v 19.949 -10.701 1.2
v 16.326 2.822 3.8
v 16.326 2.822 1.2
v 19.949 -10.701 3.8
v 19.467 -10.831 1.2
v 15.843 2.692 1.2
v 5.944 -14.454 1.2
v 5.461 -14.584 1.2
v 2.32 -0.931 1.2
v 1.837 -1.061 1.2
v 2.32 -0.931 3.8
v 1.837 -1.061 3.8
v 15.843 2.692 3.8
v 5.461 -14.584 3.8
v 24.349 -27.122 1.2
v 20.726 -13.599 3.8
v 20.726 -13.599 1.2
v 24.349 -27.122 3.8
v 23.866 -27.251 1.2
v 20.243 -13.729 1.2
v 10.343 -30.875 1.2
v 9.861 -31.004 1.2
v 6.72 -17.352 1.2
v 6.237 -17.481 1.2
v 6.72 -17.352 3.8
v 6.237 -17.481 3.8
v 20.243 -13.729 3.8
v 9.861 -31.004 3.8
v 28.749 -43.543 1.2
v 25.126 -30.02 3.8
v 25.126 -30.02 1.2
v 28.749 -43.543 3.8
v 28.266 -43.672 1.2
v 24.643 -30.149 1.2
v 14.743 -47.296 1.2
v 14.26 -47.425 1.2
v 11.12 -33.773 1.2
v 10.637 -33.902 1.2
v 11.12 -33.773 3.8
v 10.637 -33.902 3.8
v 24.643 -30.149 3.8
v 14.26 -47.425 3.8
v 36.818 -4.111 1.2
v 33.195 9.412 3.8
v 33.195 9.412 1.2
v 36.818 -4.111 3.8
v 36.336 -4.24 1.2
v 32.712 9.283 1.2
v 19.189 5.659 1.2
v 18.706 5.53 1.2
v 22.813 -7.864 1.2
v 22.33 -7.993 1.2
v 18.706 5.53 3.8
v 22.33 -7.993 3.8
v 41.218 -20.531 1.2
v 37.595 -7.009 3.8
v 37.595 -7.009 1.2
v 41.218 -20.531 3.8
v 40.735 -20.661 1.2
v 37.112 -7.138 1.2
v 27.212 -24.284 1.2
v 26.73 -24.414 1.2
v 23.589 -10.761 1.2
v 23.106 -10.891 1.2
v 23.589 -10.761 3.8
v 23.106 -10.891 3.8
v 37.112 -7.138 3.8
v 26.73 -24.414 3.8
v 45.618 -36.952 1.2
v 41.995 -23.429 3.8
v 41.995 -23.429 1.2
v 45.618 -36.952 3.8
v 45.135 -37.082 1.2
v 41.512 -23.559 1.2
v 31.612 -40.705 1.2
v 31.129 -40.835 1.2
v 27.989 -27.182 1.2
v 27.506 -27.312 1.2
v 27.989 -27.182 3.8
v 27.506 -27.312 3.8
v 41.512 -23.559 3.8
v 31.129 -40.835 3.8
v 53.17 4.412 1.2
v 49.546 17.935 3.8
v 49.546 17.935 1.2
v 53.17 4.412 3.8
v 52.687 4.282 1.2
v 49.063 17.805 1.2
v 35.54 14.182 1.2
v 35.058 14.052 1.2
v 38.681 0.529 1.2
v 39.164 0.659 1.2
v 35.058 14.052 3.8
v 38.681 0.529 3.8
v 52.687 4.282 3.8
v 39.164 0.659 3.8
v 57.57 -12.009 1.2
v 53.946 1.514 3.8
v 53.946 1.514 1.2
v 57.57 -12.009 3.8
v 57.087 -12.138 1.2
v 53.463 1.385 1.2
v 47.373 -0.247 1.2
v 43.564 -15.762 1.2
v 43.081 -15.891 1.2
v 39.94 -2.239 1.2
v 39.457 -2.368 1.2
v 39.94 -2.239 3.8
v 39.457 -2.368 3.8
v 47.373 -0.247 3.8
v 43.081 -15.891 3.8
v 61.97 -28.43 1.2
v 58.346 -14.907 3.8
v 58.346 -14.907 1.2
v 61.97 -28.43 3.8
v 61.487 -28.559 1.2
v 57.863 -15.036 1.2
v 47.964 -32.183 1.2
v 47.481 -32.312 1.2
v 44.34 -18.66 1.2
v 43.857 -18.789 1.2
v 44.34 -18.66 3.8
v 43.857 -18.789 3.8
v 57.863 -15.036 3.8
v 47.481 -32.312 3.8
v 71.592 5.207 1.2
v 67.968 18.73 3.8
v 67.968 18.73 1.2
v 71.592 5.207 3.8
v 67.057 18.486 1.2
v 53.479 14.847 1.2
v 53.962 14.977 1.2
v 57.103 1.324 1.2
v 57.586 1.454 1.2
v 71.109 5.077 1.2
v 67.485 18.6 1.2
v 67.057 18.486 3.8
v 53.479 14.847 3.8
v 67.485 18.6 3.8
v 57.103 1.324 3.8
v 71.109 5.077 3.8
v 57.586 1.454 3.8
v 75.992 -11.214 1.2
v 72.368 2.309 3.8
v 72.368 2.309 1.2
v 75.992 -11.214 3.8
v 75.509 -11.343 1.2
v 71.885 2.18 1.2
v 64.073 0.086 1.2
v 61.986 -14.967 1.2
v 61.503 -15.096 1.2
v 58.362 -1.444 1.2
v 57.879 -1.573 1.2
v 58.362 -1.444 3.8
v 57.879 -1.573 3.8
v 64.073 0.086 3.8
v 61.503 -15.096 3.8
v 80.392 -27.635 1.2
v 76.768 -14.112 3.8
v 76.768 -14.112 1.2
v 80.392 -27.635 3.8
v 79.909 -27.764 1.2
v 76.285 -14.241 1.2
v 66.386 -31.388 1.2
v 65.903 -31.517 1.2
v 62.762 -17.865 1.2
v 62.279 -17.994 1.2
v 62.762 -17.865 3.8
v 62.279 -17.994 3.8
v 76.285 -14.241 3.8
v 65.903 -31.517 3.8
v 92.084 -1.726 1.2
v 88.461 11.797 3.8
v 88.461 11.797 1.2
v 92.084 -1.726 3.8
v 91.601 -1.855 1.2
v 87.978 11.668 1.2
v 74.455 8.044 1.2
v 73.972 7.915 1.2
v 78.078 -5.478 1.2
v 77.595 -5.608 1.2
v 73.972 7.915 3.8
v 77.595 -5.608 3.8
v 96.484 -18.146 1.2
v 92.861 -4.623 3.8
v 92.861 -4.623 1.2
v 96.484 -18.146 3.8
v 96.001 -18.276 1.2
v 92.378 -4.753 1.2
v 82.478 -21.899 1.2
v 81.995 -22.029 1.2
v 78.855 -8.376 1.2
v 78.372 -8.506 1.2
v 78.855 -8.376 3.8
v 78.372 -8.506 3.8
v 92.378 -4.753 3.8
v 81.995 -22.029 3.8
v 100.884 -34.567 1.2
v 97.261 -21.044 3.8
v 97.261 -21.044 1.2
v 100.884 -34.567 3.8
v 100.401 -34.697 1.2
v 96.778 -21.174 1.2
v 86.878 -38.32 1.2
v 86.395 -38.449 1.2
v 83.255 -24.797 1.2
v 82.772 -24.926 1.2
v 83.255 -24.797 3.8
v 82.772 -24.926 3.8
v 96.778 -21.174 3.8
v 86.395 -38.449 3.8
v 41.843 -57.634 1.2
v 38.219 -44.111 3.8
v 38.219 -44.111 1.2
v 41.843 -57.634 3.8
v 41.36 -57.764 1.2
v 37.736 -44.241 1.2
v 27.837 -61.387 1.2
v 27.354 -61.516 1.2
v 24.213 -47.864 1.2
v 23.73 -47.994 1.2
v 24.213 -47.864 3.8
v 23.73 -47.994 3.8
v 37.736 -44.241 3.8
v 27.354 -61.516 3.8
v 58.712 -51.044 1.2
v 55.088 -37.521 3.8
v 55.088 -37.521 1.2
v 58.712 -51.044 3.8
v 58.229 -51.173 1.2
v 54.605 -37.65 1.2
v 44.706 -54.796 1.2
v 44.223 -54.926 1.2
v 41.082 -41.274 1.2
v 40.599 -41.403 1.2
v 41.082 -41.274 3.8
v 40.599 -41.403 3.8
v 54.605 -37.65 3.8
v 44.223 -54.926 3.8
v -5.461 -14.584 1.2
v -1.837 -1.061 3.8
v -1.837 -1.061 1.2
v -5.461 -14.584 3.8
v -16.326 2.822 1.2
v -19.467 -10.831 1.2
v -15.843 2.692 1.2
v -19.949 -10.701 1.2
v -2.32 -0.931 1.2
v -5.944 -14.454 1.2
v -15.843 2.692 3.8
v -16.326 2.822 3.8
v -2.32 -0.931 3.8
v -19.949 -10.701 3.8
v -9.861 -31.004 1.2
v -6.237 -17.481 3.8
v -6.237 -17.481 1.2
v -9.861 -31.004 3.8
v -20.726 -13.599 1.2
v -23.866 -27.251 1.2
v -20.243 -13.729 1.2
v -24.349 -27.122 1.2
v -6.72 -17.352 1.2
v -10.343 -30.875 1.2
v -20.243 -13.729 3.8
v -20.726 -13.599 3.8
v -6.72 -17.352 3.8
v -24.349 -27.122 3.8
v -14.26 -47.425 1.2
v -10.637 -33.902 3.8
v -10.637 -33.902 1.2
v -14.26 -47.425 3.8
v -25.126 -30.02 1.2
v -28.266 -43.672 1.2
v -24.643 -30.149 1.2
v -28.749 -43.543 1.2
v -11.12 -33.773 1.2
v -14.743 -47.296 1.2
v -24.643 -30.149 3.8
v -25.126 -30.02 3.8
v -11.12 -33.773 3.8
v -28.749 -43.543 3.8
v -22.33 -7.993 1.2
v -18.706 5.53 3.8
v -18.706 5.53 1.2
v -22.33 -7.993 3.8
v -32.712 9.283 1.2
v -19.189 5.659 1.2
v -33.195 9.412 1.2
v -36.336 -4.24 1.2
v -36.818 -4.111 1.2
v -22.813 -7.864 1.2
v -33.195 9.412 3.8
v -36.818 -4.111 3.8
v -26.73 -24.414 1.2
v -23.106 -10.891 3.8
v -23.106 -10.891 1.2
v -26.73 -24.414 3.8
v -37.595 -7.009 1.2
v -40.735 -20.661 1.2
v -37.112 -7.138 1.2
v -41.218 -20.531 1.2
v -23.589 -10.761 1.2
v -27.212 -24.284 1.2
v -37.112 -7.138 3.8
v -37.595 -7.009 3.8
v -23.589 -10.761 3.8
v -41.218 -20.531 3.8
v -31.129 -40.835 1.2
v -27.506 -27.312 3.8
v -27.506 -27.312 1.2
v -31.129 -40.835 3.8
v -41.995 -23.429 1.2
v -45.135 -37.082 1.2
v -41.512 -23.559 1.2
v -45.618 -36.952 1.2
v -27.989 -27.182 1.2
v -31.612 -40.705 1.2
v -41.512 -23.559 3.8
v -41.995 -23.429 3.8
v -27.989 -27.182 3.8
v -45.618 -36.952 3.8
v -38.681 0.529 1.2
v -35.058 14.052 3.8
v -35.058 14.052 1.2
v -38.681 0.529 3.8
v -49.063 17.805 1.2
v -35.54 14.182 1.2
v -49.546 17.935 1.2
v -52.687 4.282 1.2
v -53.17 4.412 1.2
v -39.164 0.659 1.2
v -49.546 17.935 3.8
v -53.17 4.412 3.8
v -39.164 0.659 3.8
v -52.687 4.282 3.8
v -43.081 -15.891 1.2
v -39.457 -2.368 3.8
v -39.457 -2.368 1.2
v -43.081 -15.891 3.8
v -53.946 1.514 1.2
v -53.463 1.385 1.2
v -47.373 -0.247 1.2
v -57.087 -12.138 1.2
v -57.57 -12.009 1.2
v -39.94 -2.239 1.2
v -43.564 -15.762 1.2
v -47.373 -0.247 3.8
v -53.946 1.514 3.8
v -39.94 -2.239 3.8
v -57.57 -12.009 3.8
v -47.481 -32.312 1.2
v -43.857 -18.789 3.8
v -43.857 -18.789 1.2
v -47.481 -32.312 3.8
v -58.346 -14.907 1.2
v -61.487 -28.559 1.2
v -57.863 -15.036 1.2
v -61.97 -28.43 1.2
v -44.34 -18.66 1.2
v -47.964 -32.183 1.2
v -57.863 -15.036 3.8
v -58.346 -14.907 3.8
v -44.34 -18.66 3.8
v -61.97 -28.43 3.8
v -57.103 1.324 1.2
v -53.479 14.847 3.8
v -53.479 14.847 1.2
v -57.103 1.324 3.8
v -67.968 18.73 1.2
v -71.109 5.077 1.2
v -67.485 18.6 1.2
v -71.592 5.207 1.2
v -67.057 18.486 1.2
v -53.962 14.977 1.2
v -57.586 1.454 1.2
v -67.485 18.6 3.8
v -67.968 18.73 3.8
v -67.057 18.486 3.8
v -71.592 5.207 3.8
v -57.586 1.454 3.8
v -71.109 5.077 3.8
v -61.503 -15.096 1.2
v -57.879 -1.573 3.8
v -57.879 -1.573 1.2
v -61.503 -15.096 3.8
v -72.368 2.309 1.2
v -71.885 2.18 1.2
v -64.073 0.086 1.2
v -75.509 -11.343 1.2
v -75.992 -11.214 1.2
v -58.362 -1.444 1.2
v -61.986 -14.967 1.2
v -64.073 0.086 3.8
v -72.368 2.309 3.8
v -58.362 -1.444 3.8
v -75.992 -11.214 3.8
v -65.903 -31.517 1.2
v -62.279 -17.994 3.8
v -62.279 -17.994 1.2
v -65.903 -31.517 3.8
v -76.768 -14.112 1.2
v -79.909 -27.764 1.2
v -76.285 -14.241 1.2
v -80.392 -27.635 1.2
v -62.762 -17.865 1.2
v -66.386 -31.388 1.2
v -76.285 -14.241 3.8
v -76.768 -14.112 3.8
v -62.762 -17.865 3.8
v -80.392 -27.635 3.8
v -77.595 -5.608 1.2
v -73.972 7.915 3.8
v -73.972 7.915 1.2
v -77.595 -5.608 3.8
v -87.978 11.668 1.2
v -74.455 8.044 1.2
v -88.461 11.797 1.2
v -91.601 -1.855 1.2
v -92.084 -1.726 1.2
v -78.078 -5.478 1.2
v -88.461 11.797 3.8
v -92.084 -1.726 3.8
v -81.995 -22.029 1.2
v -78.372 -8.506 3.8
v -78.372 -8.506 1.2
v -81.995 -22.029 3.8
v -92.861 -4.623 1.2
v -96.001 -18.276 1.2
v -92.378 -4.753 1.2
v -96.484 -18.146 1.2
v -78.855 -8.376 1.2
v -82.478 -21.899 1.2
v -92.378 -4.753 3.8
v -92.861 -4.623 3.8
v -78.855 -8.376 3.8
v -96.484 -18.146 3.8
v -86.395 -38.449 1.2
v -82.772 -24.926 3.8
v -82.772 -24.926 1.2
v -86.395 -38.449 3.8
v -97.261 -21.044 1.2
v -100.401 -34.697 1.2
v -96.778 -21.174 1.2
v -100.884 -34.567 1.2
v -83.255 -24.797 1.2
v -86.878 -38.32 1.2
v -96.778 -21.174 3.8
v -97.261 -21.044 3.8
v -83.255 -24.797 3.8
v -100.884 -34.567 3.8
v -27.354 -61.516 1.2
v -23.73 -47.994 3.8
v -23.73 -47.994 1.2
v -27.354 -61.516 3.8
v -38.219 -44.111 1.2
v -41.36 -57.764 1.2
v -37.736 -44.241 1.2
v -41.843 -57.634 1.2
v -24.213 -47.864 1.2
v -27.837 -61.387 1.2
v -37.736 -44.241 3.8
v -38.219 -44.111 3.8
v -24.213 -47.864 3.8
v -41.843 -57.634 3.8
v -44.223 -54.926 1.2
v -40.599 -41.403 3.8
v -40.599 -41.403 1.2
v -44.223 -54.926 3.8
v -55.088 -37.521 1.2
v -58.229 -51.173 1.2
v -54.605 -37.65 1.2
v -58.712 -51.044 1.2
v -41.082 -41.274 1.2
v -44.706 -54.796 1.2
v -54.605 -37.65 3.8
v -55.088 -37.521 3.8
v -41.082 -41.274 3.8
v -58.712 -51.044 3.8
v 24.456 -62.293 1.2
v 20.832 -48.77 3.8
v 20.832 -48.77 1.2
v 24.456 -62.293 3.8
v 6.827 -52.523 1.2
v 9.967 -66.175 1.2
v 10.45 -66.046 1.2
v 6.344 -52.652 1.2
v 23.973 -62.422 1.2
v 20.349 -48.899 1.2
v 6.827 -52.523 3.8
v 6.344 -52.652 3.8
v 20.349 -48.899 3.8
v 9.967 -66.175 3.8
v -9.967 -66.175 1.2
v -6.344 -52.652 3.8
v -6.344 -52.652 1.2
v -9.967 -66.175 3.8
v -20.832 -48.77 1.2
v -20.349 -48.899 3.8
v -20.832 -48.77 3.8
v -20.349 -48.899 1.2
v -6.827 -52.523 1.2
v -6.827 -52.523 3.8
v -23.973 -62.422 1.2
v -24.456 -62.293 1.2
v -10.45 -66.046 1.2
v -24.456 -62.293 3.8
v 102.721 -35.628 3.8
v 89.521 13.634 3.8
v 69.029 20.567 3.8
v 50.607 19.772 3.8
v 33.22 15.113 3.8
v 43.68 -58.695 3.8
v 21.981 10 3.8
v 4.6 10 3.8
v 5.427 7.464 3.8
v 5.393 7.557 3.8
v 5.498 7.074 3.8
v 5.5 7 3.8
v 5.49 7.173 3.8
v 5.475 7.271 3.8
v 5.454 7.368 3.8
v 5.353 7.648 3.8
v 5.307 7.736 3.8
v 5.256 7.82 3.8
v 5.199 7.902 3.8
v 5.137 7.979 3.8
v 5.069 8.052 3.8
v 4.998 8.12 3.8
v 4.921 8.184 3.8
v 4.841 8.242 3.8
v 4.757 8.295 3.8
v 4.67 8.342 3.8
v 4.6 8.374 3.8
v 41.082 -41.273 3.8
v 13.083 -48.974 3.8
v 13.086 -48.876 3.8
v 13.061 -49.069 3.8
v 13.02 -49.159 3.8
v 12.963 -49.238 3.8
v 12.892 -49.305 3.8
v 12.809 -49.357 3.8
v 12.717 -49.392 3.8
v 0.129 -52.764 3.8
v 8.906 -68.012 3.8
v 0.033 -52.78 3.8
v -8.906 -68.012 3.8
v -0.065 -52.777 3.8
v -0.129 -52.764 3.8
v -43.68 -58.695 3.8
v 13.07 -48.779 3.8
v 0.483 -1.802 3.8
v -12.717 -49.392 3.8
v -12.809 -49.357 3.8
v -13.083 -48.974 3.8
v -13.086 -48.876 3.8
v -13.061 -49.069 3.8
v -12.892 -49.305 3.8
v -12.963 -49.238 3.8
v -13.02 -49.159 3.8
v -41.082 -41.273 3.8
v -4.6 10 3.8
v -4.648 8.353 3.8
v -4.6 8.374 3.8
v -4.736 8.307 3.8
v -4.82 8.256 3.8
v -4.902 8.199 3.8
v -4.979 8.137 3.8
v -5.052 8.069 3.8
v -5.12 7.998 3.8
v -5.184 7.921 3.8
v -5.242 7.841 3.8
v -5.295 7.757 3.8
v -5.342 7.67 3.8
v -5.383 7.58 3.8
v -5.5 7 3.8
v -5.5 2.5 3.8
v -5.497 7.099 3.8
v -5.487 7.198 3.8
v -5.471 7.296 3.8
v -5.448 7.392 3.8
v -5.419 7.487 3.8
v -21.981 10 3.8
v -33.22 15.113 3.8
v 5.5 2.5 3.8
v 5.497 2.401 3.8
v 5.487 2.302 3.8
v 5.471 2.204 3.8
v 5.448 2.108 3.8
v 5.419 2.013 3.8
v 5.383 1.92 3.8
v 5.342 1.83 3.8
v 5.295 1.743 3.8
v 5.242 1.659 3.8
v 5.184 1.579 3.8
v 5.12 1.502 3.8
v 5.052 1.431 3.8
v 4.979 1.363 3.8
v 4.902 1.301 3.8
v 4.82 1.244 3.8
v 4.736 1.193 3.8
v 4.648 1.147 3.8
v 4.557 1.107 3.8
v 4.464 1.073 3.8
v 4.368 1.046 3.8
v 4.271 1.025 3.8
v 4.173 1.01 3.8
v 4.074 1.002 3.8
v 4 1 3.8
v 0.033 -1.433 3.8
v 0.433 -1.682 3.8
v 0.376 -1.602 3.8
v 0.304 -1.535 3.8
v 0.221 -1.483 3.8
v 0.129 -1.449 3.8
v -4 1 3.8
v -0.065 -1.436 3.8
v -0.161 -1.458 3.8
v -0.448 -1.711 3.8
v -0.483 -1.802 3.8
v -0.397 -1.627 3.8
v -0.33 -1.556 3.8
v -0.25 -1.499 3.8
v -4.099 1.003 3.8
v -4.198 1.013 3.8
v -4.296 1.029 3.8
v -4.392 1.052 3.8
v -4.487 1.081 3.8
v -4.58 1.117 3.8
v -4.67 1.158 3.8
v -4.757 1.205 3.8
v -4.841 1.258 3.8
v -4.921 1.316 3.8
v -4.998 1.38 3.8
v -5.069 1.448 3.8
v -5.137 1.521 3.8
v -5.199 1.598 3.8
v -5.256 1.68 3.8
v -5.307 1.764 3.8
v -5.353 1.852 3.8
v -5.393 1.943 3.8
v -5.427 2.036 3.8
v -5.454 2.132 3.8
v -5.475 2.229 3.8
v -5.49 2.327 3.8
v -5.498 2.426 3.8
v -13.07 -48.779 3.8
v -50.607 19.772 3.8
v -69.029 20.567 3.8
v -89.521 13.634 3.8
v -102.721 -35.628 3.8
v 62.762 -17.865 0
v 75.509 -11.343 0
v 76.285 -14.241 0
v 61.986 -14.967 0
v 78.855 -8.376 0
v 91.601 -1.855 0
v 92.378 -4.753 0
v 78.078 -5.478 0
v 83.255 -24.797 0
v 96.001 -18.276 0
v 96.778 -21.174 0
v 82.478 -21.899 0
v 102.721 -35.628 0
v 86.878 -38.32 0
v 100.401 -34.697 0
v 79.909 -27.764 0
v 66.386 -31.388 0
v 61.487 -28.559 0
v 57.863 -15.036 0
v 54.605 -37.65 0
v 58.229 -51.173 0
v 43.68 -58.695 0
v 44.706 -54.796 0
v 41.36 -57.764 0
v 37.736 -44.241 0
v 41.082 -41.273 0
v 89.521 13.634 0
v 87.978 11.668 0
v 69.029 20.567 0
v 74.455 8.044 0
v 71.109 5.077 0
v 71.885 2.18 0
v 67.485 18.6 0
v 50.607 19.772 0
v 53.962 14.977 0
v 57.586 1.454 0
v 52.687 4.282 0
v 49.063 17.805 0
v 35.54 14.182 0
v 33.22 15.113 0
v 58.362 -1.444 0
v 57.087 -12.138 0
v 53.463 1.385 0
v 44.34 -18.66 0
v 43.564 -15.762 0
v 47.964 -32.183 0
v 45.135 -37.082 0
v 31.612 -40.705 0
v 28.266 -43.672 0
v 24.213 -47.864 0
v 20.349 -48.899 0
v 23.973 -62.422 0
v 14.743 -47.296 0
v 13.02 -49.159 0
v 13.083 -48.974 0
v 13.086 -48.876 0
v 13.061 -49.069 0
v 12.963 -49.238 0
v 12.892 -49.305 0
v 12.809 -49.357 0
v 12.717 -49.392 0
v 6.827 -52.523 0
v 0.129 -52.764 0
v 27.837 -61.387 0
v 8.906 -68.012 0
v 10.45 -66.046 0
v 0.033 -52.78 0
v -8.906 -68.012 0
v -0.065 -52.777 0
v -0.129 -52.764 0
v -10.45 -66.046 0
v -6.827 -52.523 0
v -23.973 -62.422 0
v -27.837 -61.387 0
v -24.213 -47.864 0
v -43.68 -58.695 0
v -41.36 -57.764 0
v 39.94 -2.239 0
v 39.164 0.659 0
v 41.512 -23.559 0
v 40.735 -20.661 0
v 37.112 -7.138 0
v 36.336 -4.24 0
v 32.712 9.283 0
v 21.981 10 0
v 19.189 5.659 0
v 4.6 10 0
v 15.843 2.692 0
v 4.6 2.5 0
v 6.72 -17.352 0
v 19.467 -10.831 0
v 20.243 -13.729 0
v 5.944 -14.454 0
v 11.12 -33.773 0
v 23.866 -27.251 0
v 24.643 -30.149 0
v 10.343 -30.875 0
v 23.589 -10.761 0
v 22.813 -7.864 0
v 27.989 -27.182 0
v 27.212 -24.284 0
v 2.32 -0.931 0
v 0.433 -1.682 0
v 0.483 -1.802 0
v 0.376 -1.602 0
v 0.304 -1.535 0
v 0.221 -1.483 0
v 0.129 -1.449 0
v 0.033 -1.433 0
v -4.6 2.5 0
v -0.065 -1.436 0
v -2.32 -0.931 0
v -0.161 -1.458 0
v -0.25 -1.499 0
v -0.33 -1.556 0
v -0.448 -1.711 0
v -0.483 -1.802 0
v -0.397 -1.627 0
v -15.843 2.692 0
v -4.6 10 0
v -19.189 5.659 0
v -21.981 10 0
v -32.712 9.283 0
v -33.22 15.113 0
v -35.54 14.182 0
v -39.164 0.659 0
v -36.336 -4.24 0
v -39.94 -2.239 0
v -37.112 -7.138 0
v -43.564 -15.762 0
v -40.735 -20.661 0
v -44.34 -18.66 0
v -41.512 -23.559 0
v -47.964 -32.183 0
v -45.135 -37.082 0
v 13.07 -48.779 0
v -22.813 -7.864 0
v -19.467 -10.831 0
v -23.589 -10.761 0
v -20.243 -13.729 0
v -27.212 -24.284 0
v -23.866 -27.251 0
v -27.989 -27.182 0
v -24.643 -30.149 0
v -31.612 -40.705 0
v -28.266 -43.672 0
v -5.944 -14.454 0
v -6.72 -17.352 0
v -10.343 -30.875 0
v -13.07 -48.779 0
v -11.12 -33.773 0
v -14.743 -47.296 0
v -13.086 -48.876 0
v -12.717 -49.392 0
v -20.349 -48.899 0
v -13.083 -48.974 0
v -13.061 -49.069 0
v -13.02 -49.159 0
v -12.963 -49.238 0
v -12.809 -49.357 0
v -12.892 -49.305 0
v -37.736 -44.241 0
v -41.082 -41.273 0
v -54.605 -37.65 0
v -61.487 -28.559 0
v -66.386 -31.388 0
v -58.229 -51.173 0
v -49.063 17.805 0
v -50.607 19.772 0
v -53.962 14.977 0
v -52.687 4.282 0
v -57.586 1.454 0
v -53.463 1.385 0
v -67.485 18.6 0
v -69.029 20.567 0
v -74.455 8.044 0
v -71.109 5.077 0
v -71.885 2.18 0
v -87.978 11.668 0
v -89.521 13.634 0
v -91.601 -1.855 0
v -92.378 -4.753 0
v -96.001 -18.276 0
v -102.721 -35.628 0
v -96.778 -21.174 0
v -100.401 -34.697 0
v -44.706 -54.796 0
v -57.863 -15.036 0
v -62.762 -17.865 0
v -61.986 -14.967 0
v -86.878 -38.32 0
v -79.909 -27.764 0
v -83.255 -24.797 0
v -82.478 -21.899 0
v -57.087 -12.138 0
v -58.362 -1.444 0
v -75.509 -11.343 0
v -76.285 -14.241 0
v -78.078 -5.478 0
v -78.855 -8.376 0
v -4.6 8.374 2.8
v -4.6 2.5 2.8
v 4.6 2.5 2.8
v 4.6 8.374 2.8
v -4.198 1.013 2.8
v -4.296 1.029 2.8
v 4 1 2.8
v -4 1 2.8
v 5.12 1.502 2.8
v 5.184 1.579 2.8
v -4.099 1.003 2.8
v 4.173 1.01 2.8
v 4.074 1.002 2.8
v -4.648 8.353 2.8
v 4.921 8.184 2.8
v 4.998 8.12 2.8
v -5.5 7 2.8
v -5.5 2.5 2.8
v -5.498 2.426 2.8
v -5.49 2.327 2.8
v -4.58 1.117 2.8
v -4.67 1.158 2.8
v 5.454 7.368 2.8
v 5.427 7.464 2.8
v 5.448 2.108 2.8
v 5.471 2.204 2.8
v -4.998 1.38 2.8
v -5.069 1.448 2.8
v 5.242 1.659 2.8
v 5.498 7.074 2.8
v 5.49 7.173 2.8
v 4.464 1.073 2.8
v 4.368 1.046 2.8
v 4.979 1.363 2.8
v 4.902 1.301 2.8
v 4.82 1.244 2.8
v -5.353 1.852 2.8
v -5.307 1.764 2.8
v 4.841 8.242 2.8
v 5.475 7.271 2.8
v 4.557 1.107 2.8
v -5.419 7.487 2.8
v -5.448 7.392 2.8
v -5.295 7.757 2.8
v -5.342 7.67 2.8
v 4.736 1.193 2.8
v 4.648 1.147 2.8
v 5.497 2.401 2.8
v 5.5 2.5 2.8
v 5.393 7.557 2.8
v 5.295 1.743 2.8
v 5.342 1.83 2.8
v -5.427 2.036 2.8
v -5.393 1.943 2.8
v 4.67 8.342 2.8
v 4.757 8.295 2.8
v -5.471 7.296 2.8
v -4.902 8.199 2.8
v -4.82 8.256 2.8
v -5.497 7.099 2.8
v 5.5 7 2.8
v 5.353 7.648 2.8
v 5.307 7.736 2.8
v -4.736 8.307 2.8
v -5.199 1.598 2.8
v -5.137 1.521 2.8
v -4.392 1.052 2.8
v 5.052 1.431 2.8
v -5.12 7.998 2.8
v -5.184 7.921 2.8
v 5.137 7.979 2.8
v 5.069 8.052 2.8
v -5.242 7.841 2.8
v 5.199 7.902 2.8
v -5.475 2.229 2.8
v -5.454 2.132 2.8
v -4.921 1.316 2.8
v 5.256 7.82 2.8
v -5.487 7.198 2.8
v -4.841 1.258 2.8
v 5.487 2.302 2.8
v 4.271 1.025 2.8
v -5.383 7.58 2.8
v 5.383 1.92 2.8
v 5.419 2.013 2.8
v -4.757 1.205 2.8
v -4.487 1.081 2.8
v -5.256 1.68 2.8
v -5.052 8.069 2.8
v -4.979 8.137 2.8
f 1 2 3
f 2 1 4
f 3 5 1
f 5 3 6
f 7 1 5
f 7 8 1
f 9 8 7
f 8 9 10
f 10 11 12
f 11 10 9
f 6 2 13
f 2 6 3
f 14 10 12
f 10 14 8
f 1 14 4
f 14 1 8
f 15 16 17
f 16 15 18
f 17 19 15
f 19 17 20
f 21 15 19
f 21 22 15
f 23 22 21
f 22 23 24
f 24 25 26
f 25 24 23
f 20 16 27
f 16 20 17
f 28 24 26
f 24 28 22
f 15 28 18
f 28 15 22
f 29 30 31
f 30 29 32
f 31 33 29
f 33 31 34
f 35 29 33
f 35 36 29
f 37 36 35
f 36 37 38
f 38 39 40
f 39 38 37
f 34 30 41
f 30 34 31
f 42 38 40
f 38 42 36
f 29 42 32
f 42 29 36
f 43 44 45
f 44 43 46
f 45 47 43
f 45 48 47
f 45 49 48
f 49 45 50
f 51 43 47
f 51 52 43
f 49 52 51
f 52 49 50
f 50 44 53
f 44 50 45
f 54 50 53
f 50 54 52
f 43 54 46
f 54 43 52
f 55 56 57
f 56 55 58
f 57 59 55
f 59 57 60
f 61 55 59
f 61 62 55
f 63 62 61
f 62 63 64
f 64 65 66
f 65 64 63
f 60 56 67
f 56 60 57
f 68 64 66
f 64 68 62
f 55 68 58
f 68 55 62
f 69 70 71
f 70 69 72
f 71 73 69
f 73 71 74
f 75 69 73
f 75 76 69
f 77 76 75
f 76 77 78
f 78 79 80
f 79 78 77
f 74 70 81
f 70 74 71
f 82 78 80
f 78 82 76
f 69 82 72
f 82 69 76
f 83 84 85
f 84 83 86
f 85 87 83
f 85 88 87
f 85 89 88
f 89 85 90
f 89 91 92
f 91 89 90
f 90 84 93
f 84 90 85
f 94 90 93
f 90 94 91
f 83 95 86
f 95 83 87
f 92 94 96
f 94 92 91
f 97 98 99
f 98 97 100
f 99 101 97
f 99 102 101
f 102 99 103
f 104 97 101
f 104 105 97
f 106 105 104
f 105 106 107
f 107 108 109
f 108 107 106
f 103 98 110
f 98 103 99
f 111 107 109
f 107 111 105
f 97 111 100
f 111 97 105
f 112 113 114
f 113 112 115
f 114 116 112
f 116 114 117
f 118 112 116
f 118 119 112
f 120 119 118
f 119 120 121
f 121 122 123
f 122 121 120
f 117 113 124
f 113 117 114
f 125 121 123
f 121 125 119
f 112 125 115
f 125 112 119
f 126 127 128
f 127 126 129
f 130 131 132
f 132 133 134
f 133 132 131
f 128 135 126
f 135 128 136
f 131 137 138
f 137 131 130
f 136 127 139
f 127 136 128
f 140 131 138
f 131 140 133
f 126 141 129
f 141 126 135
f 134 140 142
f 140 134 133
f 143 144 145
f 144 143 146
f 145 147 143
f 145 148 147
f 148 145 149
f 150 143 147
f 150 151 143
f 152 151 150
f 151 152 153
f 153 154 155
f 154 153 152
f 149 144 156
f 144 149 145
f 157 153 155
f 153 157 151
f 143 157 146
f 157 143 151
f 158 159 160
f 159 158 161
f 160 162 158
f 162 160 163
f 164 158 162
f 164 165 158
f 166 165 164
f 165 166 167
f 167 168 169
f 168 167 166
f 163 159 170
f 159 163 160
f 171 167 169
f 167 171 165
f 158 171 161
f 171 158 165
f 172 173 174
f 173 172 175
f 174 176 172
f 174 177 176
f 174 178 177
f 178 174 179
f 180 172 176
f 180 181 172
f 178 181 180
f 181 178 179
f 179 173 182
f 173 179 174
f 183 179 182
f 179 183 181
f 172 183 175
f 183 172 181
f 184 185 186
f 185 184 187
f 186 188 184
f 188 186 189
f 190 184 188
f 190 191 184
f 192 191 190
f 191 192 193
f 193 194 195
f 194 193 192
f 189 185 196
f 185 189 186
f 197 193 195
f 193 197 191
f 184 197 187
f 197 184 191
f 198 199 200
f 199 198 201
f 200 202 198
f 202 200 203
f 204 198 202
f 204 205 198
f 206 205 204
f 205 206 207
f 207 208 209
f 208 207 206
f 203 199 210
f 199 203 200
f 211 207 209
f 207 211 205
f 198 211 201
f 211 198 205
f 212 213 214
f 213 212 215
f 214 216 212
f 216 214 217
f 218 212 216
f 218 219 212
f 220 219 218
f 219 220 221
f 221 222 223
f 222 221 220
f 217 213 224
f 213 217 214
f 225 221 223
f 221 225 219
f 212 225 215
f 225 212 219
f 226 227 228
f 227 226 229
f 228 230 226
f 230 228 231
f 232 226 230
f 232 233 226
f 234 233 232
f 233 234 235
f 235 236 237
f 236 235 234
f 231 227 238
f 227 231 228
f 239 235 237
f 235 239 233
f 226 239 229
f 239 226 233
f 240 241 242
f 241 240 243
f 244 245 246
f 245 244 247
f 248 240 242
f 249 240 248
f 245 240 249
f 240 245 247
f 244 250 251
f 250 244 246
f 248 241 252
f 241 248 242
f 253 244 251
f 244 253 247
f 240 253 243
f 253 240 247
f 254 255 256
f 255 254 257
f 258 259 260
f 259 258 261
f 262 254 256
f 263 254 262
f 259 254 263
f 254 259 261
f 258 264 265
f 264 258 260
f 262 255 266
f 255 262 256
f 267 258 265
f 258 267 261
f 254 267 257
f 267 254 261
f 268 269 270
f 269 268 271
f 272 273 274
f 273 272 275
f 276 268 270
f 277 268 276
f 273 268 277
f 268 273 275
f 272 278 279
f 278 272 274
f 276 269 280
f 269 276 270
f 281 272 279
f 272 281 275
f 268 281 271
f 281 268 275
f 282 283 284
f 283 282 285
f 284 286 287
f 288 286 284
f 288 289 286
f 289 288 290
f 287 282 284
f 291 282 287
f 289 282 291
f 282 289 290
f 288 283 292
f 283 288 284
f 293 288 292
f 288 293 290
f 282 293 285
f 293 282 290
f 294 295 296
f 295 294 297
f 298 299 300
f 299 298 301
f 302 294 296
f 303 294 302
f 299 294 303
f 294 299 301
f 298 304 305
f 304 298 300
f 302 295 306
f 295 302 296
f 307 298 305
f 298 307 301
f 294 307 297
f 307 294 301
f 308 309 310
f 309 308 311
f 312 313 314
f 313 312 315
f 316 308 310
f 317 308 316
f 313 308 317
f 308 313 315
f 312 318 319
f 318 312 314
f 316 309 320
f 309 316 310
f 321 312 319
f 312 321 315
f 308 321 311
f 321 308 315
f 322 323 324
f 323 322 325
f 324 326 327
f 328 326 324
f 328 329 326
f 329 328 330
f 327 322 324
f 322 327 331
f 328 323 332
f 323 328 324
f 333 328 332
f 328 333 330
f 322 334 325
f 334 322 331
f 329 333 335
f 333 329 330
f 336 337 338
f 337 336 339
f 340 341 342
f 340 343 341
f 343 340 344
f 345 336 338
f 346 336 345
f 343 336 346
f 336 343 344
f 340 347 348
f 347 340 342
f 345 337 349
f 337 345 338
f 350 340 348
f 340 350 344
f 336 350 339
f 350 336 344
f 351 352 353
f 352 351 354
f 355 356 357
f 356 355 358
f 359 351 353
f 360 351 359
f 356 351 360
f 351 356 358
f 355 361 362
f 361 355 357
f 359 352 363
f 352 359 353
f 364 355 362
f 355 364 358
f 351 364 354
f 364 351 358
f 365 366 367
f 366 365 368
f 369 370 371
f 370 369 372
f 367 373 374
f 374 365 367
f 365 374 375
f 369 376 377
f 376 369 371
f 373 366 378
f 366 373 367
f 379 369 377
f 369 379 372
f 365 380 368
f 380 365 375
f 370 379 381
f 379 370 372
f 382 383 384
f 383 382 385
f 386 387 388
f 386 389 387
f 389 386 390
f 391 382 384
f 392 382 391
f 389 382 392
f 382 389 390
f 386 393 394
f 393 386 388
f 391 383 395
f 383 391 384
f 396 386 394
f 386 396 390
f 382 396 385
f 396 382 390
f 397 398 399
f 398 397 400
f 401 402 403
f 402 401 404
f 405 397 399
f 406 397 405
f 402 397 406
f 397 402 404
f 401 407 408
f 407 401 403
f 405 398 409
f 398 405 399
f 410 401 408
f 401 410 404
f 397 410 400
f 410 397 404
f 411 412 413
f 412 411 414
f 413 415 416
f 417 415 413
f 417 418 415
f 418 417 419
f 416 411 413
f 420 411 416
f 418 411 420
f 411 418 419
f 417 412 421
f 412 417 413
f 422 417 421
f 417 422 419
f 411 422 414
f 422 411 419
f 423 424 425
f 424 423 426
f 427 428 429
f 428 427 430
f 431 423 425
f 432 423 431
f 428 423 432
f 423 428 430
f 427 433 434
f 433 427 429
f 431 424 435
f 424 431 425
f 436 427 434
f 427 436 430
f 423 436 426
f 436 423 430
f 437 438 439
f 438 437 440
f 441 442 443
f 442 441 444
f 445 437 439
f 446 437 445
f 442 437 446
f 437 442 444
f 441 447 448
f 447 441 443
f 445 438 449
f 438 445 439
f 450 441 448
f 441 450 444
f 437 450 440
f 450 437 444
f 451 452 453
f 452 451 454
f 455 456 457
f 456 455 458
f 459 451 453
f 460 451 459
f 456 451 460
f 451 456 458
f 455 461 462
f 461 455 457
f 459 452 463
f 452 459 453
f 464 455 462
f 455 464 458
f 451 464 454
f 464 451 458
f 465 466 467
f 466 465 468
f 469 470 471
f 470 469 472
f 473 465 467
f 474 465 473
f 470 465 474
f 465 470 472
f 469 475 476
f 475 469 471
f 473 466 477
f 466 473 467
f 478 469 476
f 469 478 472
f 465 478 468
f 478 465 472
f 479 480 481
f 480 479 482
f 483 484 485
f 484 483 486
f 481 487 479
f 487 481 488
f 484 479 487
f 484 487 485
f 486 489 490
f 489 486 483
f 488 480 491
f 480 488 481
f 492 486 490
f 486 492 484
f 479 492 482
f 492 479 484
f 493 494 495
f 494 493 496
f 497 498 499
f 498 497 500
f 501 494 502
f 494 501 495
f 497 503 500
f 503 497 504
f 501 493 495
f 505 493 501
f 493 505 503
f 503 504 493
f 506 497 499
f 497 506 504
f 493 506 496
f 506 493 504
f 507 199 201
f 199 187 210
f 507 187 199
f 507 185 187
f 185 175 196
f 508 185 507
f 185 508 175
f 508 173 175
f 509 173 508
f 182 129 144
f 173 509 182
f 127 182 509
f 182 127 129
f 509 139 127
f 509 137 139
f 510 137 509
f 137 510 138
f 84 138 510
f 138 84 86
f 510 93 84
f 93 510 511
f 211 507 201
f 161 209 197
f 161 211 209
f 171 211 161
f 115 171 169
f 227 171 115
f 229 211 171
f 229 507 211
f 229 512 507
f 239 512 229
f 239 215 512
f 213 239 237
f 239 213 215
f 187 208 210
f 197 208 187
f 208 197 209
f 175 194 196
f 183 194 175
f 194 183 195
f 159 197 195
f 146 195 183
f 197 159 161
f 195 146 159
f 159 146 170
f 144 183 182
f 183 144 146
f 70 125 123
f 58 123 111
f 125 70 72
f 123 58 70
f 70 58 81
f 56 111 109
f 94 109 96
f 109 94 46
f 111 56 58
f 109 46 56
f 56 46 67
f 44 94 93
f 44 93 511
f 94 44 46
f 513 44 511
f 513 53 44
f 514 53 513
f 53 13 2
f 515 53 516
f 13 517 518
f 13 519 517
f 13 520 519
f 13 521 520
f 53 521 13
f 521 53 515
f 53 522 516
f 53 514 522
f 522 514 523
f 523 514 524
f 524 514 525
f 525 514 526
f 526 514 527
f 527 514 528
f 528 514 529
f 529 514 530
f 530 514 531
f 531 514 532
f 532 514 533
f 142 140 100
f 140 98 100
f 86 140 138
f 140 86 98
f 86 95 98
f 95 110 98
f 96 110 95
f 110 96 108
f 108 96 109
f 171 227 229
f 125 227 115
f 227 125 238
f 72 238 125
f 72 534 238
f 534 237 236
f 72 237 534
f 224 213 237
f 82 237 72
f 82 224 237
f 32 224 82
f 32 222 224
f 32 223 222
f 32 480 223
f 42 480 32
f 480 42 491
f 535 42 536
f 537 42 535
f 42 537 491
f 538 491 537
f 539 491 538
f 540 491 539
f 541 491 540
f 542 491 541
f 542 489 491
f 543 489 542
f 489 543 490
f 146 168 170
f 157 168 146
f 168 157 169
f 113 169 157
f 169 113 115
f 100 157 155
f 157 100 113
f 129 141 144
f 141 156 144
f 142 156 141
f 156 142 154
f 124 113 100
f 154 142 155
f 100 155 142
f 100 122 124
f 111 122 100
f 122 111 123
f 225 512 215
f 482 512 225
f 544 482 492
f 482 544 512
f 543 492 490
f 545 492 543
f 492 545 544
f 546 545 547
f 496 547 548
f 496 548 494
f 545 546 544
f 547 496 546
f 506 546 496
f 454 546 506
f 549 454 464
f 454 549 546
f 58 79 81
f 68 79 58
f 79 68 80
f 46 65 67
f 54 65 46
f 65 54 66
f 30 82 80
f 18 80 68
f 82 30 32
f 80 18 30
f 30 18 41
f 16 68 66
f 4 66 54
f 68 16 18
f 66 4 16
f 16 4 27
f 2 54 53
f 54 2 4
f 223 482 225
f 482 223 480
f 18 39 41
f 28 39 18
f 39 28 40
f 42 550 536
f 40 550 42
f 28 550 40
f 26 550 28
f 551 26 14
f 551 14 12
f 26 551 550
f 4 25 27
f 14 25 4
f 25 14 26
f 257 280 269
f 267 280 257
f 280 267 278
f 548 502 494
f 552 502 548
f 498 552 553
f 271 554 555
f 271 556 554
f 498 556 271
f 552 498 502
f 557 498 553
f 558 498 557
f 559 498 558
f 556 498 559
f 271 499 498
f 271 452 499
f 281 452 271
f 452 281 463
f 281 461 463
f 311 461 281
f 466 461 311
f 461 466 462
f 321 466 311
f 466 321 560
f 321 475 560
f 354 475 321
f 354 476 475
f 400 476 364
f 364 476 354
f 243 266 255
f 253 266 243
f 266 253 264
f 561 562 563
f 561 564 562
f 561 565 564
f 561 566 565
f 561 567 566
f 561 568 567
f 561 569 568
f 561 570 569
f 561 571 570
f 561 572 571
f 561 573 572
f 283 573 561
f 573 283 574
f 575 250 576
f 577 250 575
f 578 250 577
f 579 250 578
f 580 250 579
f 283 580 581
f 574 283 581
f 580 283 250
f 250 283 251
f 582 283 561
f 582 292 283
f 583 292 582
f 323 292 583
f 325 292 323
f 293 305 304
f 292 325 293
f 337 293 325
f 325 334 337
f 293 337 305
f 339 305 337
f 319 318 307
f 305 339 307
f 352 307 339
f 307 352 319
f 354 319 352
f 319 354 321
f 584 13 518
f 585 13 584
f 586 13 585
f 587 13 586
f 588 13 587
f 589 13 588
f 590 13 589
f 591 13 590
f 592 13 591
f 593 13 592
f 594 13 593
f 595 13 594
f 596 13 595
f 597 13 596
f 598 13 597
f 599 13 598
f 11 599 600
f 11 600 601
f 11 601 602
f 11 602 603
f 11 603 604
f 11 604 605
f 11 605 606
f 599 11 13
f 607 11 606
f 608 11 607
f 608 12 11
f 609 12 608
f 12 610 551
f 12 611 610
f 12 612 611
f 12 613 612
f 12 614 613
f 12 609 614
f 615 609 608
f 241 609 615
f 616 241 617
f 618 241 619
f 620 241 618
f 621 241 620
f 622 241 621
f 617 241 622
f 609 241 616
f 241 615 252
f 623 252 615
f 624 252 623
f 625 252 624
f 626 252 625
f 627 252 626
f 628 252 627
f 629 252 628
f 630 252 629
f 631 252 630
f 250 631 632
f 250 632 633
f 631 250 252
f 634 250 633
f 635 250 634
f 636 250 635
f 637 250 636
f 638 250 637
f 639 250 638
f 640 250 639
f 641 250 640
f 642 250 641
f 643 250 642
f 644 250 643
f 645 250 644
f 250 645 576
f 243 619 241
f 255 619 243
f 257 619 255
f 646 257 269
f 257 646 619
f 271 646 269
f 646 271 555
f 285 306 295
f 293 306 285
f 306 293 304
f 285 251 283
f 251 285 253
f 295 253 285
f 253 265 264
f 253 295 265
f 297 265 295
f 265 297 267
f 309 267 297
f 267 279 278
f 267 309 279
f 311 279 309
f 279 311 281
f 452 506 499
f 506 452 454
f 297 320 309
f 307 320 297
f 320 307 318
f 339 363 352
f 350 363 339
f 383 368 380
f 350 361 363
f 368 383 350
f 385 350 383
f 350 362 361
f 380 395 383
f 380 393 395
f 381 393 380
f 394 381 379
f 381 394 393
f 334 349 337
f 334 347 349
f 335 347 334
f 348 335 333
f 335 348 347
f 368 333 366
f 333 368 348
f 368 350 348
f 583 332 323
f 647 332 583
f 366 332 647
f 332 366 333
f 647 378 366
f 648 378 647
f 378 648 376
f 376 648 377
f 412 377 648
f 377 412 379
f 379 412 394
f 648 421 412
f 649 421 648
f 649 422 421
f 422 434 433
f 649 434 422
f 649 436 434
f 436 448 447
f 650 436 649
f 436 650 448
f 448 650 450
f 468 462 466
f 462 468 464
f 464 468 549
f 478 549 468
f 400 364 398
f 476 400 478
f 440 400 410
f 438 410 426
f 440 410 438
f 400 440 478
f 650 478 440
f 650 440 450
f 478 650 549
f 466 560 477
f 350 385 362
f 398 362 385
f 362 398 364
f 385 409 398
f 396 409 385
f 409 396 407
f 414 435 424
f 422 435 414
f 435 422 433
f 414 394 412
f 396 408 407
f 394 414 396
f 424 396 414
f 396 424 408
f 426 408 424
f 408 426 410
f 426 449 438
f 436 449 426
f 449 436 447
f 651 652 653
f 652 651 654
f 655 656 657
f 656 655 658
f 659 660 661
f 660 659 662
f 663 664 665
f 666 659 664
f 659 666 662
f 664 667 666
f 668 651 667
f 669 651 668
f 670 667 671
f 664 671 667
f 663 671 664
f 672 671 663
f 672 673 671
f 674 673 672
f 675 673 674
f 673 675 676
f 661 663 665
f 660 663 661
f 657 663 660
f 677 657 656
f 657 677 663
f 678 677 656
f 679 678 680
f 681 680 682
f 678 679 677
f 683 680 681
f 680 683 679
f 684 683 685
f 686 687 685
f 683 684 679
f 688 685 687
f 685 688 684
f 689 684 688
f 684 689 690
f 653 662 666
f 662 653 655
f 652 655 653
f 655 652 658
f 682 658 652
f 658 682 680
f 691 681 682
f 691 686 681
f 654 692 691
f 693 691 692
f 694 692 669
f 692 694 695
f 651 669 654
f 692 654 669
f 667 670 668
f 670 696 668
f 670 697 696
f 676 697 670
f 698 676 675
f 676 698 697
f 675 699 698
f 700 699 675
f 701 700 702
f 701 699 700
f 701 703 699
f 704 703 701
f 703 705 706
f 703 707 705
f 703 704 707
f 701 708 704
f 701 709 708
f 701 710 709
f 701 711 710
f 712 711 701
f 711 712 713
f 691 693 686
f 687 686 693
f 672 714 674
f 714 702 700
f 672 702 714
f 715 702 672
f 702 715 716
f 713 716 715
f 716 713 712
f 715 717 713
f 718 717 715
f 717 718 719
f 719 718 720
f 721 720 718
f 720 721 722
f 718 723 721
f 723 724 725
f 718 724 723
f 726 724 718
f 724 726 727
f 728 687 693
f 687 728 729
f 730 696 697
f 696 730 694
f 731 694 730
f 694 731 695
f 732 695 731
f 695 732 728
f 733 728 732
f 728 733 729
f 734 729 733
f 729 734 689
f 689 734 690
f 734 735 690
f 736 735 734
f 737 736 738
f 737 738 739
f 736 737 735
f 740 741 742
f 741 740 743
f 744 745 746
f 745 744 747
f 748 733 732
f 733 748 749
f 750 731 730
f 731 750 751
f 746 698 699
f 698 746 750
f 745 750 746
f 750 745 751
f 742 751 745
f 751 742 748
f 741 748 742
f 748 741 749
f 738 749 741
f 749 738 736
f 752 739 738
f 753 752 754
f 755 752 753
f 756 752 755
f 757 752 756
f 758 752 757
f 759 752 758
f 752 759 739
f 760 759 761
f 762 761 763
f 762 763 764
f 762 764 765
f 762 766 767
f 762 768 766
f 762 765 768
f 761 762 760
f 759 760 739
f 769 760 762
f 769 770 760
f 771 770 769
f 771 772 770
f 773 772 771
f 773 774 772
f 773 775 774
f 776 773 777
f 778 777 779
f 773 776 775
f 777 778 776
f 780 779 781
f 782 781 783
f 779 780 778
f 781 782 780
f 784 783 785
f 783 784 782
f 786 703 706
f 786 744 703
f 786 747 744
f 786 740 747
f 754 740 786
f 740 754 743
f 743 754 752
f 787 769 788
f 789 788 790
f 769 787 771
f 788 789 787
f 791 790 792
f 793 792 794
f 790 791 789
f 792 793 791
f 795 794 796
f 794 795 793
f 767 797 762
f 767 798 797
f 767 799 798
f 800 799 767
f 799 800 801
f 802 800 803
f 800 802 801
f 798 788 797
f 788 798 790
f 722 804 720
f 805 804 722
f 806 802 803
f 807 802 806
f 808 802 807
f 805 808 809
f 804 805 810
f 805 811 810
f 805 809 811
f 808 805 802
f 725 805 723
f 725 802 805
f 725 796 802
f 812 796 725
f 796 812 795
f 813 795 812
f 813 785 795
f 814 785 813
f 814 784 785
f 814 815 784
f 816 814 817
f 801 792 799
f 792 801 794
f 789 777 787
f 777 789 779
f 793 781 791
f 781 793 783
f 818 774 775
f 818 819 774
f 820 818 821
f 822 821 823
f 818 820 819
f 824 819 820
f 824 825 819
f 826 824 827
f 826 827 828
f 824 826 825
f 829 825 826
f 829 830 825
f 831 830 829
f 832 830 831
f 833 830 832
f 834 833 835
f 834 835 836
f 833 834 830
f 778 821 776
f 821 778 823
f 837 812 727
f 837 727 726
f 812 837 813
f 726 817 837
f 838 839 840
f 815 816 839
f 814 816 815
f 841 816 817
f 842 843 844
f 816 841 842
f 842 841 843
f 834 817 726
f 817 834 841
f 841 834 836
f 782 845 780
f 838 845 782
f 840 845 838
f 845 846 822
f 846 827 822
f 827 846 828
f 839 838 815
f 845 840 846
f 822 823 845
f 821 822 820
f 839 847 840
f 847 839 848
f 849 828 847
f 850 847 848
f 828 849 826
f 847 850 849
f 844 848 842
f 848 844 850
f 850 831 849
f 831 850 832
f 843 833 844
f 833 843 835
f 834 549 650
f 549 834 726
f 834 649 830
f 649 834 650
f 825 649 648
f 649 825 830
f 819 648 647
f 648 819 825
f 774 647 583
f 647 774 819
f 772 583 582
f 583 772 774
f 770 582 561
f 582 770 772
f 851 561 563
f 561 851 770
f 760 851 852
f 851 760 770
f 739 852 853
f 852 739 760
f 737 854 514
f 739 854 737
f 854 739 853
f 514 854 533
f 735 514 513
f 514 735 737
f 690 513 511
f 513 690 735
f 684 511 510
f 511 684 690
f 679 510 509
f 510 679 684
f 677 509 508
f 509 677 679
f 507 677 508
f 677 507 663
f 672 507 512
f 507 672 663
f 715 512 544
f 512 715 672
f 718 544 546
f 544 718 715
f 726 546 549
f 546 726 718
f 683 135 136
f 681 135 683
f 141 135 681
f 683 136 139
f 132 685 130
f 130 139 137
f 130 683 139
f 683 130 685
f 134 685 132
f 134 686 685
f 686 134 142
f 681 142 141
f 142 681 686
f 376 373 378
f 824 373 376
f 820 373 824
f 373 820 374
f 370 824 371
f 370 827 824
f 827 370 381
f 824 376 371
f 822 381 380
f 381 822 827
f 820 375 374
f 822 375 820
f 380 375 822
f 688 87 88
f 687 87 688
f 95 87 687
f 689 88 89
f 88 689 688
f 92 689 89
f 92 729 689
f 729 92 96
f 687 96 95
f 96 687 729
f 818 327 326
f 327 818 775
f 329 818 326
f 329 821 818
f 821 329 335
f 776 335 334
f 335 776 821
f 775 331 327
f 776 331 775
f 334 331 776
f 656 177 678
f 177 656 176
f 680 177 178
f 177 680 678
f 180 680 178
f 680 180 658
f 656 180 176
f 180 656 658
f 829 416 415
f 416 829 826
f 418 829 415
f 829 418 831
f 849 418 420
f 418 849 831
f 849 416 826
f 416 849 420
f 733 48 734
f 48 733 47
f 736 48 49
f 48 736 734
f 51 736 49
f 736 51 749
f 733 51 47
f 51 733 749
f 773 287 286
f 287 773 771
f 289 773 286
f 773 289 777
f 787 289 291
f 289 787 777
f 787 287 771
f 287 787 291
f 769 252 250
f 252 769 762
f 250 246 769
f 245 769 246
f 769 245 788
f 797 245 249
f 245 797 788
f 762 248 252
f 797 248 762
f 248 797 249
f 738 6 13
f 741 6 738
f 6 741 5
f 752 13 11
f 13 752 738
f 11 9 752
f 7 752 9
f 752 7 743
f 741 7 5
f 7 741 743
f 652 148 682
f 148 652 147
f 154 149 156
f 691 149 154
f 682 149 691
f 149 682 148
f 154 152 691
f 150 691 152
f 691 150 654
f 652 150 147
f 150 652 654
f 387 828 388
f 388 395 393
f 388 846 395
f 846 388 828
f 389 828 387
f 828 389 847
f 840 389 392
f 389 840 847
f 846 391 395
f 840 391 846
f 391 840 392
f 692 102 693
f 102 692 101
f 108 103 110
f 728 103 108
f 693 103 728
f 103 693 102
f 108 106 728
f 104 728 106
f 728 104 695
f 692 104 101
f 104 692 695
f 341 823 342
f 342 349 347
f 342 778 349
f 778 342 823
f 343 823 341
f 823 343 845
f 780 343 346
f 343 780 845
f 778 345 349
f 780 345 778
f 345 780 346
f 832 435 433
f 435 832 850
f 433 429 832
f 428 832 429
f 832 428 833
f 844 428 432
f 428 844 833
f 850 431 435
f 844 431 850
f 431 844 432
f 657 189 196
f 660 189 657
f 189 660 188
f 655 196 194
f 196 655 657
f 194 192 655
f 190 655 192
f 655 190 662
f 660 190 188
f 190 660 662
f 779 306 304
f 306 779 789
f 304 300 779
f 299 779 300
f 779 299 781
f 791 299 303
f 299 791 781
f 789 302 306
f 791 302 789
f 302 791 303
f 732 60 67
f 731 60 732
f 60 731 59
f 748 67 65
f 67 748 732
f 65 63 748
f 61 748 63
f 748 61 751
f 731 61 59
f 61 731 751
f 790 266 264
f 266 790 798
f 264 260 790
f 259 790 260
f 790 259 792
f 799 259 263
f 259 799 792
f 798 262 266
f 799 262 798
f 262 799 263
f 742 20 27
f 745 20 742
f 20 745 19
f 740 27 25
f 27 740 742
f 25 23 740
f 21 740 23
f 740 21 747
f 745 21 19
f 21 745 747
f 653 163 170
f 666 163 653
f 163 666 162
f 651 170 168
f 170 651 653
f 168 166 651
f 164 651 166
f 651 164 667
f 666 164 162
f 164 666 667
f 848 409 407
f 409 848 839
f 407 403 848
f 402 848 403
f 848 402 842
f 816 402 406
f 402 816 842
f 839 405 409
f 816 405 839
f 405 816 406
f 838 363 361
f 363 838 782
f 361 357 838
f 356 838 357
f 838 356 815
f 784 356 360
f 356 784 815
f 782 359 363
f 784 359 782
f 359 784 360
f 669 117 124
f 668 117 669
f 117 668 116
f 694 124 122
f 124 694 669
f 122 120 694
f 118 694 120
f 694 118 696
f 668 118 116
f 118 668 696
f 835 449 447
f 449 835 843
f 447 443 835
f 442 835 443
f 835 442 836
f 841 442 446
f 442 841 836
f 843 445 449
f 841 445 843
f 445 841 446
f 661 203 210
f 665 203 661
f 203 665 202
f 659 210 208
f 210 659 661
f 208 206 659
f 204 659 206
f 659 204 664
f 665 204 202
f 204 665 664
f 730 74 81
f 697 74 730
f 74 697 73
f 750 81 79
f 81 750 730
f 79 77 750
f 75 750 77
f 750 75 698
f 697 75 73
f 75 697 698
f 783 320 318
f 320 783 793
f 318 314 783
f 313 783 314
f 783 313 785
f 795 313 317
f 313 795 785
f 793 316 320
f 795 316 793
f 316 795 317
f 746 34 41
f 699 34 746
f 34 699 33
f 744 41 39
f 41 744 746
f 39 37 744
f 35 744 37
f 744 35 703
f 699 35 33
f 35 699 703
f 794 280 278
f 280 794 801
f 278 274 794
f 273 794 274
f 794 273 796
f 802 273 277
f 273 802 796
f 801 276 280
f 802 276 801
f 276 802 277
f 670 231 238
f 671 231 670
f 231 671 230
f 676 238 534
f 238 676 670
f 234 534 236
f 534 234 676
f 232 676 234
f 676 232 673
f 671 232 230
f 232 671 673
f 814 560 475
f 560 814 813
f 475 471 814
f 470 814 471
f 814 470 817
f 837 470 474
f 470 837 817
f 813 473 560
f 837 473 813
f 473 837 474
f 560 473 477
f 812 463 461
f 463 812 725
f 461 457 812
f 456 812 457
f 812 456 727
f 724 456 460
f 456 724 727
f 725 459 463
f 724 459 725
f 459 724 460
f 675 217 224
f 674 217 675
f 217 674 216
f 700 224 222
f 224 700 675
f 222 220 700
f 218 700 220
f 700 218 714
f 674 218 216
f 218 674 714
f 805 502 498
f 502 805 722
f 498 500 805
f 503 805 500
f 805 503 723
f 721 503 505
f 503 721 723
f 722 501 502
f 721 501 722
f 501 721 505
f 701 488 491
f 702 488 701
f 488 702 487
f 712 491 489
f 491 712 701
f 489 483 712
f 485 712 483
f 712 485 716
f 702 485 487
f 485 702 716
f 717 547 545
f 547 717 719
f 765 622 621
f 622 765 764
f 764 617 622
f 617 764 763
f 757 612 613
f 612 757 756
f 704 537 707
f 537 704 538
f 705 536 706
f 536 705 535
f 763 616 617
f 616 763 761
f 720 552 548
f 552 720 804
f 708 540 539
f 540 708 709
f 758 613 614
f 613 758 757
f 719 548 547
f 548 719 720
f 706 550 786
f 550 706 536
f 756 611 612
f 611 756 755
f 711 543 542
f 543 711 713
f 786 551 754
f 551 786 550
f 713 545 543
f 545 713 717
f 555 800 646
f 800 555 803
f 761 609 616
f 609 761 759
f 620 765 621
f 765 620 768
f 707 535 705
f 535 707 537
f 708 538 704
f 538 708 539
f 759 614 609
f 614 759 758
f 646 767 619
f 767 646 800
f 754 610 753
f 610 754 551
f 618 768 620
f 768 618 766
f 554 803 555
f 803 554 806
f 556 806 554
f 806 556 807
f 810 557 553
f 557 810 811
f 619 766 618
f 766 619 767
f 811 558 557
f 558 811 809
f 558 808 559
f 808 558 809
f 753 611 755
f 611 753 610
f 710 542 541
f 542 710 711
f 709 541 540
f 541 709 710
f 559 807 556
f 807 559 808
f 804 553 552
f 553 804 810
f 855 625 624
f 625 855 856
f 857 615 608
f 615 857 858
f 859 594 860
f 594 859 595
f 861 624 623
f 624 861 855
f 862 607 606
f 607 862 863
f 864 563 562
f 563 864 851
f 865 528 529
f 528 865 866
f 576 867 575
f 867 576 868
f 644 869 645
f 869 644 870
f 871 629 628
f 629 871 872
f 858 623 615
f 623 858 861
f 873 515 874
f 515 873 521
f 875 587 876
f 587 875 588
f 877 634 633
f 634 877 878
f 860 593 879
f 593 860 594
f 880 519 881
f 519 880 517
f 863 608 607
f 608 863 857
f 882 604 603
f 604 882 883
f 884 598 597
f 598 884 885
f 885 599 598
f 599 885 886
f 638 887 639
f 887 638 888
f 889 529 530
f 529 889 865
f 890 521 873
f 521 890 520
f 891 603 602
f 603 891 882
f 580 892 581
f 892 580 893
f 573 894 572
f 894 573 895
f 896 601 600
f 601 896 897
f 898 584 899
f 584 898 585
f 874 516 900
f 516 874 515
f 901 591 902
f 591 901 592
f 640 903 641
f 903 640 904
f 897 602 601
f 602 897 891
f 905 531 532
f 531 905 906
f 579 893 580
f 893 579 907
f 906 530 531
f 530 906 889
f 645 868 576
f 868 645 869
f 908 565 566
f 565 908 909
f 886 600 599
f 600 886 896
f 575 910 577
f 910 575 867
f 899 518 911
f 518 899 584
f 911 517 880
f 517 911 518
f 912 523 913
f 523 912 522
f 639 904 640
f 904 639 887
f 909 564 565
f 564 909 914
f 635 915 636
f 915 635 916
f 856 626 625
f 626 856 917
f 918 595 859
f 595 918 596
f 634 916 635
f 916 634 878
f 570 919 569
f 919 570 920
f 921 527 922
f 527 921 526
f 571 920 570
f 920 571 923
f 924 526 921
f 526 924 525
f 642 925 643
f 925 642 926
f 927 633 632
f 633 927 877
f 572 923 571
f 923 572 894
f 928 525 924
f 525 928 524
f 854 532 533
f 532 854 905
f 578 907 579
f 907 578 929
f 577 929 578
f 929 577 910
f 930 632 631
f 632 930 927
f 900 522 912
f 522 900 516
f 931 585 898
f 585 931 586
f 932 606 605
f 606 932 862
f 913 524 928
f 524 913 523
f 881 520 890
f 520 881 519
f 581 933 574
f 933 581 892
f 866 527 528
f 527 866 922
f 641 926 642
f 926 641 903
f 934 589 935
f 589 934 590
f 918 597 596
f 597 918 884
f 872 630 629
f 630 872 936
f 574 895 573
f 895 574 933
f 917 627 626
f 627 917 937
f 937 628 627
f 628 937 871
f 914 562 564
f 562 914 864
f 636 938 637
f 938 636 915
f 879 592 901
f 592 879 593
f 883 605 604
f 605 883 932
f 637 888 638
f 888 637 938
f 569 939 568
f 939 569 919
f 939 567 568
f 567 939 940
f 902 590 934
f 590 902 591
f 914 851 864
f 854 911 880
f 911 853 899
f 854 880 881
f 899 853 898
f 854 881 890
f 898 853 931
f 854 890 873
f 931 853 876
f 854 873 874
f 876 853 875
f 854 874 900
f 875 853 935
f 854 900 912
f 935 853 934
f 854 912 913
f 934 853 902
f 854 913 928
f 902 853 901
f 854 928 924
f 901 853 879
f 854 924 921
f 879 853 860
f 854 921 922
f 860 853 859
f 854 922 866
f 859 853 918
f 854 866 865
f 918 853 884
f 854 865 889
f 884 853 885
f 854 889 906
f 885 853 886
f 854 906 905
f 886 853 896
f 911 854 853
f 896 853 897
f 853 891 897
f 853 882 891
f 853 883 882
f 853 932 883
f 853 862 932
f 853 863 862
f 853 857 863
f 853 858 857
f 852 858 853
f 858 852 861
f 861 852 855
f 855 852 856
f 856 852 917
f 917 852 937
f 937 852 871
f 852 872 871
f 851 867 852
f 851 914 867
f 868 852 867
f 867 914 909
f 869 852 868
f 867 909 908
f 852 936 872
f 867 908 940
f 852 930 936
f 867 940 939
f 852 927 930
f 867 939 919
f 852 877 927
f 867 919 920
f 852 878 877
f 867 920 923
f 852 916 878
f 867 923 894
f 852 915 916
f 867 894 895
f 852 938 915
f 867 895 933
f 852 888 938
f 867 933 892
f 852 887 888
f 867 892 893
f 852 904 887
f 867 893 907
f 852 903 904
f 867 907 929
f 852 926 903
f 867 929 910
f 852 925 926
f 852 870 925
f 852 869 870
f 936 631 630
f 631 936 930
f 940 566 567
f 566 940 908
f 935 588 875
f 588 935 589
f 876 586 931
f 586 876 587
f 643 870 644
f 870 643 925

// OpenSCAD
// file: utils.scad
module rounded(r) {
    offset(r) offset(-r) children();
}

module rounded_square(size=1, center=false, r=1) {
    rounded(r) square(size, center=center);
}
// file: key.scad
use <utils.scad>

module keycap() {
    translate([0,0,4]) hull() {
        linear_extrude(0.1) square([17.5, 16.5], center=true);
        translate([0, 0, 3]) linear_extrude(0.1) rounded_square(12, r=1.5, center=true);
    }
}

module switch() {
    translate([0,0,-2.2]) linear_extrude(3) rounded_square([13.5,13.5], r=1, center=true);
    linear_extrude(3, scale=0.8) rounded_square([15, 15], r=1, center=true);
    translate([0,0,-2.2-2.65]) cylinder(h=5, d=4);
}
// file: lib.scad
use <key.scad>
use <utils.scad>

$fs=0.1;
$fa=1;

pcb_depth=5.4-1.6;
electronic_pocket_depth=pcb_depth-1.4;

nb_cols=5;
nb_rows=3;
nb_thumbs=3;
inter_switch_x=18;
inter_switch_y=17;
deltas=[0,2,6,2,-10];// column stagger
hand_angle=15;
top=10;

module one_side_key_placement(side) {
    rotate([0,0,side * hand_angle]) {
          for (j=[0:nb_cols-1]) {
               translate([side*(j+0.5)*inter_switch_x, deltas[j], 0]) {
                    for (i=[0.5:nb_rows]) {
                         translate([0, -i*inter_switch_y, 0]) children();
                    }
               }
          }
          min_deltas=min([for (i=[0:nb_thumbs-1]) deltas[i]]);
          for (j=[0:nb_thumbs-2]) {
              delta=min(deltas[j], deltas[j+1]);
              translate([side*(j+1)*inter_switch_x, -(0.5+nb_rows)*inter_switch_y + delta]) children();
          }
     }
}

module extreme_thumb_key_placement(side) {
    rotate([0,0,side * hand_angle])
        translate([0, -(0.5+nb_rows)*inter_switch_y + deltas[0]])
            children();
}

module key_placement() {
     for (side=[-1,1]) {
          one_side_key_placement(side) children();
          extreme_thumb_key_placement(side) children();
     }
}

module outline() {
    for (side=[-1,1]) {
        hull() one_side_key_placement(side)
            square([inter_switch_x, inter_switch_y], center=true);
    }
    hull() {
        translate([0, top/2]) square([6*inter_switch_x, top], center=true);
        for (side=[-1,1])
            extreme_thumb_key_placement(side)
                square([inter_switch_x, inter_switch_y], center=true);
    }
}

module sod323() {
    color([0.8,0.8,0.8]) linear_extrude(0.15) square([2.7,0.35], center=true);
    color([0.1,0.1,0.1]) linear_extrude(1.1) square([1.8,1.4], center=true);
}

module smd0805() {
    linear_extrude(1) square([2,1.25], center=true);
}

module diode_placement() {
    key_placement() translate([0,4.7]) children();
}

module pcb() {
    translate([0,0,-pcb_depth]) {
        // FR4
        color([0,0.5,0]) {
            difference() {
                translate([0,0,-1.6]) linear_extrude(1.6, convexity=4) outline();
                key_placement() {
                    cylinder(d=3.429, h=4, center=true);
                    for (i=[-5.5,5.5]) translate([i,0]) cylinder(d=1.7018, h=4, center=true);
                    translate([0,-5.9]) cylinder(d=1.27, h=4, center=true);
                    translate([-5,-3.8]) cylinder(d=1.27, h=4, center=true);
                }
            }
        }
       // USB-C connector
        color([0.8,0.8,0.8]) translate([0,top,3.2/2]) rotate([90,0,0]) linear_extrude(7.4)
            rounded_square([9, 3.2], r=1.2, center=true);
        // MCU
        translate([0,-41]) {
            color([0.1,0.1,0.1]) linear_extrude(1.6) rounded_square([7,7], r=0.75, center=true);
            color([0.8,0.8,0.8]) linear_extrude(0.15) for (i=[-2.75:0.5:2.75]) {
                translate([i,0]) square([0.2,9], center=true);
                translate([0,i]) square([9,0.2], center=true);
            }
        }
        // LDO
        translate([0,-28]) {
            color([0.1,0.1,0.1]) linear_extrude(1) square([2.9,1.3], center=true);
            color([0.8,0.8,0.8]) linear_extrude(0.15) {
                translate([0,0.6]) square([0.4,1.2], center=true);
                translate([0.95,-0.6]) square([0.4,1.2], center=true);
                translate([-0.95,-0.6]) square([0.4,1.2], center=true);
            }
        }
        // resistors
        color([0.1,0.1,0.1]) {
            for (i=[-2,2]) translate([i,-19]) rotate([0,0,90]) smd0805();
            translate([0,-50]) smd0805();
        }
        // capacitors
        color([0.8,0.7,0.5]) {
            translate([0,-24]) smd0805();
            translate([0,-32]) smd0805();
            for (i=[-6,6]) {
                translate([i,-35]) smd0805();
                translate([i,-47]) smd0805();
            }
        }
        // diodes
        diode_placement() sod323();
    }
}

module plate() {
    difference() {
        outline();
        key_placement() square([14, 14], center=true);
        tolerance=0.1;
        translate([0,top]) square([9+2*tolerance, (7.4+tolerance)*2], center=true);
        //translate([(9+2*tolerance)/2, top-((7.4+tolerance)*2)/2]) rotate(45) translate([0, 1.5]) circle(1.5);
    }
}

module fat_plate(pocket_rounding=0.5, visible_components=false) {
    translate([0,0,-pcb_depth]) {
        difference() {
            linear_extrude(pcb_depth, convexity=4) plate();

            // Extended key holes
            key_placement() translate([0,0,-1]) linear_extrude(pcb_depth+1-1.2)
                square([15, 14], center=true);

            // Center pocket
            translate([0,0,-1]) linear_extrude(visible_components?pcb_depth+2:electronic_pocket_depth+1) {
                rounded(pocket_rounding) intersection() {
                    s=nb_rows*17;
                    rotate([0, 0, -hand_angle]) translate([0,-s]) square([s, s]);
                    mirror([1,0]) rotate([0, 0, -hand_angle]) translate([0,-s]) square([s, s]);
                }
            }

            // USB-C connector pocket
            translate([0,top-1.5-7.5/2,-1]) linear_extrude(2)
                rounded_square([9+2, 7.5], r=1.5, center=true);
        }
    }
}

module back() {
    color([0.2,0.2,0.2]) translate([0,0,-pcb_depth-1.6-0.6]) linear_extrude(0.6) difference() {
        outline();
        translate([0,-48]) rounded_square([16,3], center=true, r=1.49);
    }
}

color([0.5,0.5,0.5]) fat_plate(visible_components=true);
pcb();
//back();
color([1,1,1,0.8]) key_placement() switch();
color([0.9,0.9,0.9]) key_placement() keycap();
// main file
use <lib.scad>;

rotate([0,180,0]) fat_plate(visible_components=true);
